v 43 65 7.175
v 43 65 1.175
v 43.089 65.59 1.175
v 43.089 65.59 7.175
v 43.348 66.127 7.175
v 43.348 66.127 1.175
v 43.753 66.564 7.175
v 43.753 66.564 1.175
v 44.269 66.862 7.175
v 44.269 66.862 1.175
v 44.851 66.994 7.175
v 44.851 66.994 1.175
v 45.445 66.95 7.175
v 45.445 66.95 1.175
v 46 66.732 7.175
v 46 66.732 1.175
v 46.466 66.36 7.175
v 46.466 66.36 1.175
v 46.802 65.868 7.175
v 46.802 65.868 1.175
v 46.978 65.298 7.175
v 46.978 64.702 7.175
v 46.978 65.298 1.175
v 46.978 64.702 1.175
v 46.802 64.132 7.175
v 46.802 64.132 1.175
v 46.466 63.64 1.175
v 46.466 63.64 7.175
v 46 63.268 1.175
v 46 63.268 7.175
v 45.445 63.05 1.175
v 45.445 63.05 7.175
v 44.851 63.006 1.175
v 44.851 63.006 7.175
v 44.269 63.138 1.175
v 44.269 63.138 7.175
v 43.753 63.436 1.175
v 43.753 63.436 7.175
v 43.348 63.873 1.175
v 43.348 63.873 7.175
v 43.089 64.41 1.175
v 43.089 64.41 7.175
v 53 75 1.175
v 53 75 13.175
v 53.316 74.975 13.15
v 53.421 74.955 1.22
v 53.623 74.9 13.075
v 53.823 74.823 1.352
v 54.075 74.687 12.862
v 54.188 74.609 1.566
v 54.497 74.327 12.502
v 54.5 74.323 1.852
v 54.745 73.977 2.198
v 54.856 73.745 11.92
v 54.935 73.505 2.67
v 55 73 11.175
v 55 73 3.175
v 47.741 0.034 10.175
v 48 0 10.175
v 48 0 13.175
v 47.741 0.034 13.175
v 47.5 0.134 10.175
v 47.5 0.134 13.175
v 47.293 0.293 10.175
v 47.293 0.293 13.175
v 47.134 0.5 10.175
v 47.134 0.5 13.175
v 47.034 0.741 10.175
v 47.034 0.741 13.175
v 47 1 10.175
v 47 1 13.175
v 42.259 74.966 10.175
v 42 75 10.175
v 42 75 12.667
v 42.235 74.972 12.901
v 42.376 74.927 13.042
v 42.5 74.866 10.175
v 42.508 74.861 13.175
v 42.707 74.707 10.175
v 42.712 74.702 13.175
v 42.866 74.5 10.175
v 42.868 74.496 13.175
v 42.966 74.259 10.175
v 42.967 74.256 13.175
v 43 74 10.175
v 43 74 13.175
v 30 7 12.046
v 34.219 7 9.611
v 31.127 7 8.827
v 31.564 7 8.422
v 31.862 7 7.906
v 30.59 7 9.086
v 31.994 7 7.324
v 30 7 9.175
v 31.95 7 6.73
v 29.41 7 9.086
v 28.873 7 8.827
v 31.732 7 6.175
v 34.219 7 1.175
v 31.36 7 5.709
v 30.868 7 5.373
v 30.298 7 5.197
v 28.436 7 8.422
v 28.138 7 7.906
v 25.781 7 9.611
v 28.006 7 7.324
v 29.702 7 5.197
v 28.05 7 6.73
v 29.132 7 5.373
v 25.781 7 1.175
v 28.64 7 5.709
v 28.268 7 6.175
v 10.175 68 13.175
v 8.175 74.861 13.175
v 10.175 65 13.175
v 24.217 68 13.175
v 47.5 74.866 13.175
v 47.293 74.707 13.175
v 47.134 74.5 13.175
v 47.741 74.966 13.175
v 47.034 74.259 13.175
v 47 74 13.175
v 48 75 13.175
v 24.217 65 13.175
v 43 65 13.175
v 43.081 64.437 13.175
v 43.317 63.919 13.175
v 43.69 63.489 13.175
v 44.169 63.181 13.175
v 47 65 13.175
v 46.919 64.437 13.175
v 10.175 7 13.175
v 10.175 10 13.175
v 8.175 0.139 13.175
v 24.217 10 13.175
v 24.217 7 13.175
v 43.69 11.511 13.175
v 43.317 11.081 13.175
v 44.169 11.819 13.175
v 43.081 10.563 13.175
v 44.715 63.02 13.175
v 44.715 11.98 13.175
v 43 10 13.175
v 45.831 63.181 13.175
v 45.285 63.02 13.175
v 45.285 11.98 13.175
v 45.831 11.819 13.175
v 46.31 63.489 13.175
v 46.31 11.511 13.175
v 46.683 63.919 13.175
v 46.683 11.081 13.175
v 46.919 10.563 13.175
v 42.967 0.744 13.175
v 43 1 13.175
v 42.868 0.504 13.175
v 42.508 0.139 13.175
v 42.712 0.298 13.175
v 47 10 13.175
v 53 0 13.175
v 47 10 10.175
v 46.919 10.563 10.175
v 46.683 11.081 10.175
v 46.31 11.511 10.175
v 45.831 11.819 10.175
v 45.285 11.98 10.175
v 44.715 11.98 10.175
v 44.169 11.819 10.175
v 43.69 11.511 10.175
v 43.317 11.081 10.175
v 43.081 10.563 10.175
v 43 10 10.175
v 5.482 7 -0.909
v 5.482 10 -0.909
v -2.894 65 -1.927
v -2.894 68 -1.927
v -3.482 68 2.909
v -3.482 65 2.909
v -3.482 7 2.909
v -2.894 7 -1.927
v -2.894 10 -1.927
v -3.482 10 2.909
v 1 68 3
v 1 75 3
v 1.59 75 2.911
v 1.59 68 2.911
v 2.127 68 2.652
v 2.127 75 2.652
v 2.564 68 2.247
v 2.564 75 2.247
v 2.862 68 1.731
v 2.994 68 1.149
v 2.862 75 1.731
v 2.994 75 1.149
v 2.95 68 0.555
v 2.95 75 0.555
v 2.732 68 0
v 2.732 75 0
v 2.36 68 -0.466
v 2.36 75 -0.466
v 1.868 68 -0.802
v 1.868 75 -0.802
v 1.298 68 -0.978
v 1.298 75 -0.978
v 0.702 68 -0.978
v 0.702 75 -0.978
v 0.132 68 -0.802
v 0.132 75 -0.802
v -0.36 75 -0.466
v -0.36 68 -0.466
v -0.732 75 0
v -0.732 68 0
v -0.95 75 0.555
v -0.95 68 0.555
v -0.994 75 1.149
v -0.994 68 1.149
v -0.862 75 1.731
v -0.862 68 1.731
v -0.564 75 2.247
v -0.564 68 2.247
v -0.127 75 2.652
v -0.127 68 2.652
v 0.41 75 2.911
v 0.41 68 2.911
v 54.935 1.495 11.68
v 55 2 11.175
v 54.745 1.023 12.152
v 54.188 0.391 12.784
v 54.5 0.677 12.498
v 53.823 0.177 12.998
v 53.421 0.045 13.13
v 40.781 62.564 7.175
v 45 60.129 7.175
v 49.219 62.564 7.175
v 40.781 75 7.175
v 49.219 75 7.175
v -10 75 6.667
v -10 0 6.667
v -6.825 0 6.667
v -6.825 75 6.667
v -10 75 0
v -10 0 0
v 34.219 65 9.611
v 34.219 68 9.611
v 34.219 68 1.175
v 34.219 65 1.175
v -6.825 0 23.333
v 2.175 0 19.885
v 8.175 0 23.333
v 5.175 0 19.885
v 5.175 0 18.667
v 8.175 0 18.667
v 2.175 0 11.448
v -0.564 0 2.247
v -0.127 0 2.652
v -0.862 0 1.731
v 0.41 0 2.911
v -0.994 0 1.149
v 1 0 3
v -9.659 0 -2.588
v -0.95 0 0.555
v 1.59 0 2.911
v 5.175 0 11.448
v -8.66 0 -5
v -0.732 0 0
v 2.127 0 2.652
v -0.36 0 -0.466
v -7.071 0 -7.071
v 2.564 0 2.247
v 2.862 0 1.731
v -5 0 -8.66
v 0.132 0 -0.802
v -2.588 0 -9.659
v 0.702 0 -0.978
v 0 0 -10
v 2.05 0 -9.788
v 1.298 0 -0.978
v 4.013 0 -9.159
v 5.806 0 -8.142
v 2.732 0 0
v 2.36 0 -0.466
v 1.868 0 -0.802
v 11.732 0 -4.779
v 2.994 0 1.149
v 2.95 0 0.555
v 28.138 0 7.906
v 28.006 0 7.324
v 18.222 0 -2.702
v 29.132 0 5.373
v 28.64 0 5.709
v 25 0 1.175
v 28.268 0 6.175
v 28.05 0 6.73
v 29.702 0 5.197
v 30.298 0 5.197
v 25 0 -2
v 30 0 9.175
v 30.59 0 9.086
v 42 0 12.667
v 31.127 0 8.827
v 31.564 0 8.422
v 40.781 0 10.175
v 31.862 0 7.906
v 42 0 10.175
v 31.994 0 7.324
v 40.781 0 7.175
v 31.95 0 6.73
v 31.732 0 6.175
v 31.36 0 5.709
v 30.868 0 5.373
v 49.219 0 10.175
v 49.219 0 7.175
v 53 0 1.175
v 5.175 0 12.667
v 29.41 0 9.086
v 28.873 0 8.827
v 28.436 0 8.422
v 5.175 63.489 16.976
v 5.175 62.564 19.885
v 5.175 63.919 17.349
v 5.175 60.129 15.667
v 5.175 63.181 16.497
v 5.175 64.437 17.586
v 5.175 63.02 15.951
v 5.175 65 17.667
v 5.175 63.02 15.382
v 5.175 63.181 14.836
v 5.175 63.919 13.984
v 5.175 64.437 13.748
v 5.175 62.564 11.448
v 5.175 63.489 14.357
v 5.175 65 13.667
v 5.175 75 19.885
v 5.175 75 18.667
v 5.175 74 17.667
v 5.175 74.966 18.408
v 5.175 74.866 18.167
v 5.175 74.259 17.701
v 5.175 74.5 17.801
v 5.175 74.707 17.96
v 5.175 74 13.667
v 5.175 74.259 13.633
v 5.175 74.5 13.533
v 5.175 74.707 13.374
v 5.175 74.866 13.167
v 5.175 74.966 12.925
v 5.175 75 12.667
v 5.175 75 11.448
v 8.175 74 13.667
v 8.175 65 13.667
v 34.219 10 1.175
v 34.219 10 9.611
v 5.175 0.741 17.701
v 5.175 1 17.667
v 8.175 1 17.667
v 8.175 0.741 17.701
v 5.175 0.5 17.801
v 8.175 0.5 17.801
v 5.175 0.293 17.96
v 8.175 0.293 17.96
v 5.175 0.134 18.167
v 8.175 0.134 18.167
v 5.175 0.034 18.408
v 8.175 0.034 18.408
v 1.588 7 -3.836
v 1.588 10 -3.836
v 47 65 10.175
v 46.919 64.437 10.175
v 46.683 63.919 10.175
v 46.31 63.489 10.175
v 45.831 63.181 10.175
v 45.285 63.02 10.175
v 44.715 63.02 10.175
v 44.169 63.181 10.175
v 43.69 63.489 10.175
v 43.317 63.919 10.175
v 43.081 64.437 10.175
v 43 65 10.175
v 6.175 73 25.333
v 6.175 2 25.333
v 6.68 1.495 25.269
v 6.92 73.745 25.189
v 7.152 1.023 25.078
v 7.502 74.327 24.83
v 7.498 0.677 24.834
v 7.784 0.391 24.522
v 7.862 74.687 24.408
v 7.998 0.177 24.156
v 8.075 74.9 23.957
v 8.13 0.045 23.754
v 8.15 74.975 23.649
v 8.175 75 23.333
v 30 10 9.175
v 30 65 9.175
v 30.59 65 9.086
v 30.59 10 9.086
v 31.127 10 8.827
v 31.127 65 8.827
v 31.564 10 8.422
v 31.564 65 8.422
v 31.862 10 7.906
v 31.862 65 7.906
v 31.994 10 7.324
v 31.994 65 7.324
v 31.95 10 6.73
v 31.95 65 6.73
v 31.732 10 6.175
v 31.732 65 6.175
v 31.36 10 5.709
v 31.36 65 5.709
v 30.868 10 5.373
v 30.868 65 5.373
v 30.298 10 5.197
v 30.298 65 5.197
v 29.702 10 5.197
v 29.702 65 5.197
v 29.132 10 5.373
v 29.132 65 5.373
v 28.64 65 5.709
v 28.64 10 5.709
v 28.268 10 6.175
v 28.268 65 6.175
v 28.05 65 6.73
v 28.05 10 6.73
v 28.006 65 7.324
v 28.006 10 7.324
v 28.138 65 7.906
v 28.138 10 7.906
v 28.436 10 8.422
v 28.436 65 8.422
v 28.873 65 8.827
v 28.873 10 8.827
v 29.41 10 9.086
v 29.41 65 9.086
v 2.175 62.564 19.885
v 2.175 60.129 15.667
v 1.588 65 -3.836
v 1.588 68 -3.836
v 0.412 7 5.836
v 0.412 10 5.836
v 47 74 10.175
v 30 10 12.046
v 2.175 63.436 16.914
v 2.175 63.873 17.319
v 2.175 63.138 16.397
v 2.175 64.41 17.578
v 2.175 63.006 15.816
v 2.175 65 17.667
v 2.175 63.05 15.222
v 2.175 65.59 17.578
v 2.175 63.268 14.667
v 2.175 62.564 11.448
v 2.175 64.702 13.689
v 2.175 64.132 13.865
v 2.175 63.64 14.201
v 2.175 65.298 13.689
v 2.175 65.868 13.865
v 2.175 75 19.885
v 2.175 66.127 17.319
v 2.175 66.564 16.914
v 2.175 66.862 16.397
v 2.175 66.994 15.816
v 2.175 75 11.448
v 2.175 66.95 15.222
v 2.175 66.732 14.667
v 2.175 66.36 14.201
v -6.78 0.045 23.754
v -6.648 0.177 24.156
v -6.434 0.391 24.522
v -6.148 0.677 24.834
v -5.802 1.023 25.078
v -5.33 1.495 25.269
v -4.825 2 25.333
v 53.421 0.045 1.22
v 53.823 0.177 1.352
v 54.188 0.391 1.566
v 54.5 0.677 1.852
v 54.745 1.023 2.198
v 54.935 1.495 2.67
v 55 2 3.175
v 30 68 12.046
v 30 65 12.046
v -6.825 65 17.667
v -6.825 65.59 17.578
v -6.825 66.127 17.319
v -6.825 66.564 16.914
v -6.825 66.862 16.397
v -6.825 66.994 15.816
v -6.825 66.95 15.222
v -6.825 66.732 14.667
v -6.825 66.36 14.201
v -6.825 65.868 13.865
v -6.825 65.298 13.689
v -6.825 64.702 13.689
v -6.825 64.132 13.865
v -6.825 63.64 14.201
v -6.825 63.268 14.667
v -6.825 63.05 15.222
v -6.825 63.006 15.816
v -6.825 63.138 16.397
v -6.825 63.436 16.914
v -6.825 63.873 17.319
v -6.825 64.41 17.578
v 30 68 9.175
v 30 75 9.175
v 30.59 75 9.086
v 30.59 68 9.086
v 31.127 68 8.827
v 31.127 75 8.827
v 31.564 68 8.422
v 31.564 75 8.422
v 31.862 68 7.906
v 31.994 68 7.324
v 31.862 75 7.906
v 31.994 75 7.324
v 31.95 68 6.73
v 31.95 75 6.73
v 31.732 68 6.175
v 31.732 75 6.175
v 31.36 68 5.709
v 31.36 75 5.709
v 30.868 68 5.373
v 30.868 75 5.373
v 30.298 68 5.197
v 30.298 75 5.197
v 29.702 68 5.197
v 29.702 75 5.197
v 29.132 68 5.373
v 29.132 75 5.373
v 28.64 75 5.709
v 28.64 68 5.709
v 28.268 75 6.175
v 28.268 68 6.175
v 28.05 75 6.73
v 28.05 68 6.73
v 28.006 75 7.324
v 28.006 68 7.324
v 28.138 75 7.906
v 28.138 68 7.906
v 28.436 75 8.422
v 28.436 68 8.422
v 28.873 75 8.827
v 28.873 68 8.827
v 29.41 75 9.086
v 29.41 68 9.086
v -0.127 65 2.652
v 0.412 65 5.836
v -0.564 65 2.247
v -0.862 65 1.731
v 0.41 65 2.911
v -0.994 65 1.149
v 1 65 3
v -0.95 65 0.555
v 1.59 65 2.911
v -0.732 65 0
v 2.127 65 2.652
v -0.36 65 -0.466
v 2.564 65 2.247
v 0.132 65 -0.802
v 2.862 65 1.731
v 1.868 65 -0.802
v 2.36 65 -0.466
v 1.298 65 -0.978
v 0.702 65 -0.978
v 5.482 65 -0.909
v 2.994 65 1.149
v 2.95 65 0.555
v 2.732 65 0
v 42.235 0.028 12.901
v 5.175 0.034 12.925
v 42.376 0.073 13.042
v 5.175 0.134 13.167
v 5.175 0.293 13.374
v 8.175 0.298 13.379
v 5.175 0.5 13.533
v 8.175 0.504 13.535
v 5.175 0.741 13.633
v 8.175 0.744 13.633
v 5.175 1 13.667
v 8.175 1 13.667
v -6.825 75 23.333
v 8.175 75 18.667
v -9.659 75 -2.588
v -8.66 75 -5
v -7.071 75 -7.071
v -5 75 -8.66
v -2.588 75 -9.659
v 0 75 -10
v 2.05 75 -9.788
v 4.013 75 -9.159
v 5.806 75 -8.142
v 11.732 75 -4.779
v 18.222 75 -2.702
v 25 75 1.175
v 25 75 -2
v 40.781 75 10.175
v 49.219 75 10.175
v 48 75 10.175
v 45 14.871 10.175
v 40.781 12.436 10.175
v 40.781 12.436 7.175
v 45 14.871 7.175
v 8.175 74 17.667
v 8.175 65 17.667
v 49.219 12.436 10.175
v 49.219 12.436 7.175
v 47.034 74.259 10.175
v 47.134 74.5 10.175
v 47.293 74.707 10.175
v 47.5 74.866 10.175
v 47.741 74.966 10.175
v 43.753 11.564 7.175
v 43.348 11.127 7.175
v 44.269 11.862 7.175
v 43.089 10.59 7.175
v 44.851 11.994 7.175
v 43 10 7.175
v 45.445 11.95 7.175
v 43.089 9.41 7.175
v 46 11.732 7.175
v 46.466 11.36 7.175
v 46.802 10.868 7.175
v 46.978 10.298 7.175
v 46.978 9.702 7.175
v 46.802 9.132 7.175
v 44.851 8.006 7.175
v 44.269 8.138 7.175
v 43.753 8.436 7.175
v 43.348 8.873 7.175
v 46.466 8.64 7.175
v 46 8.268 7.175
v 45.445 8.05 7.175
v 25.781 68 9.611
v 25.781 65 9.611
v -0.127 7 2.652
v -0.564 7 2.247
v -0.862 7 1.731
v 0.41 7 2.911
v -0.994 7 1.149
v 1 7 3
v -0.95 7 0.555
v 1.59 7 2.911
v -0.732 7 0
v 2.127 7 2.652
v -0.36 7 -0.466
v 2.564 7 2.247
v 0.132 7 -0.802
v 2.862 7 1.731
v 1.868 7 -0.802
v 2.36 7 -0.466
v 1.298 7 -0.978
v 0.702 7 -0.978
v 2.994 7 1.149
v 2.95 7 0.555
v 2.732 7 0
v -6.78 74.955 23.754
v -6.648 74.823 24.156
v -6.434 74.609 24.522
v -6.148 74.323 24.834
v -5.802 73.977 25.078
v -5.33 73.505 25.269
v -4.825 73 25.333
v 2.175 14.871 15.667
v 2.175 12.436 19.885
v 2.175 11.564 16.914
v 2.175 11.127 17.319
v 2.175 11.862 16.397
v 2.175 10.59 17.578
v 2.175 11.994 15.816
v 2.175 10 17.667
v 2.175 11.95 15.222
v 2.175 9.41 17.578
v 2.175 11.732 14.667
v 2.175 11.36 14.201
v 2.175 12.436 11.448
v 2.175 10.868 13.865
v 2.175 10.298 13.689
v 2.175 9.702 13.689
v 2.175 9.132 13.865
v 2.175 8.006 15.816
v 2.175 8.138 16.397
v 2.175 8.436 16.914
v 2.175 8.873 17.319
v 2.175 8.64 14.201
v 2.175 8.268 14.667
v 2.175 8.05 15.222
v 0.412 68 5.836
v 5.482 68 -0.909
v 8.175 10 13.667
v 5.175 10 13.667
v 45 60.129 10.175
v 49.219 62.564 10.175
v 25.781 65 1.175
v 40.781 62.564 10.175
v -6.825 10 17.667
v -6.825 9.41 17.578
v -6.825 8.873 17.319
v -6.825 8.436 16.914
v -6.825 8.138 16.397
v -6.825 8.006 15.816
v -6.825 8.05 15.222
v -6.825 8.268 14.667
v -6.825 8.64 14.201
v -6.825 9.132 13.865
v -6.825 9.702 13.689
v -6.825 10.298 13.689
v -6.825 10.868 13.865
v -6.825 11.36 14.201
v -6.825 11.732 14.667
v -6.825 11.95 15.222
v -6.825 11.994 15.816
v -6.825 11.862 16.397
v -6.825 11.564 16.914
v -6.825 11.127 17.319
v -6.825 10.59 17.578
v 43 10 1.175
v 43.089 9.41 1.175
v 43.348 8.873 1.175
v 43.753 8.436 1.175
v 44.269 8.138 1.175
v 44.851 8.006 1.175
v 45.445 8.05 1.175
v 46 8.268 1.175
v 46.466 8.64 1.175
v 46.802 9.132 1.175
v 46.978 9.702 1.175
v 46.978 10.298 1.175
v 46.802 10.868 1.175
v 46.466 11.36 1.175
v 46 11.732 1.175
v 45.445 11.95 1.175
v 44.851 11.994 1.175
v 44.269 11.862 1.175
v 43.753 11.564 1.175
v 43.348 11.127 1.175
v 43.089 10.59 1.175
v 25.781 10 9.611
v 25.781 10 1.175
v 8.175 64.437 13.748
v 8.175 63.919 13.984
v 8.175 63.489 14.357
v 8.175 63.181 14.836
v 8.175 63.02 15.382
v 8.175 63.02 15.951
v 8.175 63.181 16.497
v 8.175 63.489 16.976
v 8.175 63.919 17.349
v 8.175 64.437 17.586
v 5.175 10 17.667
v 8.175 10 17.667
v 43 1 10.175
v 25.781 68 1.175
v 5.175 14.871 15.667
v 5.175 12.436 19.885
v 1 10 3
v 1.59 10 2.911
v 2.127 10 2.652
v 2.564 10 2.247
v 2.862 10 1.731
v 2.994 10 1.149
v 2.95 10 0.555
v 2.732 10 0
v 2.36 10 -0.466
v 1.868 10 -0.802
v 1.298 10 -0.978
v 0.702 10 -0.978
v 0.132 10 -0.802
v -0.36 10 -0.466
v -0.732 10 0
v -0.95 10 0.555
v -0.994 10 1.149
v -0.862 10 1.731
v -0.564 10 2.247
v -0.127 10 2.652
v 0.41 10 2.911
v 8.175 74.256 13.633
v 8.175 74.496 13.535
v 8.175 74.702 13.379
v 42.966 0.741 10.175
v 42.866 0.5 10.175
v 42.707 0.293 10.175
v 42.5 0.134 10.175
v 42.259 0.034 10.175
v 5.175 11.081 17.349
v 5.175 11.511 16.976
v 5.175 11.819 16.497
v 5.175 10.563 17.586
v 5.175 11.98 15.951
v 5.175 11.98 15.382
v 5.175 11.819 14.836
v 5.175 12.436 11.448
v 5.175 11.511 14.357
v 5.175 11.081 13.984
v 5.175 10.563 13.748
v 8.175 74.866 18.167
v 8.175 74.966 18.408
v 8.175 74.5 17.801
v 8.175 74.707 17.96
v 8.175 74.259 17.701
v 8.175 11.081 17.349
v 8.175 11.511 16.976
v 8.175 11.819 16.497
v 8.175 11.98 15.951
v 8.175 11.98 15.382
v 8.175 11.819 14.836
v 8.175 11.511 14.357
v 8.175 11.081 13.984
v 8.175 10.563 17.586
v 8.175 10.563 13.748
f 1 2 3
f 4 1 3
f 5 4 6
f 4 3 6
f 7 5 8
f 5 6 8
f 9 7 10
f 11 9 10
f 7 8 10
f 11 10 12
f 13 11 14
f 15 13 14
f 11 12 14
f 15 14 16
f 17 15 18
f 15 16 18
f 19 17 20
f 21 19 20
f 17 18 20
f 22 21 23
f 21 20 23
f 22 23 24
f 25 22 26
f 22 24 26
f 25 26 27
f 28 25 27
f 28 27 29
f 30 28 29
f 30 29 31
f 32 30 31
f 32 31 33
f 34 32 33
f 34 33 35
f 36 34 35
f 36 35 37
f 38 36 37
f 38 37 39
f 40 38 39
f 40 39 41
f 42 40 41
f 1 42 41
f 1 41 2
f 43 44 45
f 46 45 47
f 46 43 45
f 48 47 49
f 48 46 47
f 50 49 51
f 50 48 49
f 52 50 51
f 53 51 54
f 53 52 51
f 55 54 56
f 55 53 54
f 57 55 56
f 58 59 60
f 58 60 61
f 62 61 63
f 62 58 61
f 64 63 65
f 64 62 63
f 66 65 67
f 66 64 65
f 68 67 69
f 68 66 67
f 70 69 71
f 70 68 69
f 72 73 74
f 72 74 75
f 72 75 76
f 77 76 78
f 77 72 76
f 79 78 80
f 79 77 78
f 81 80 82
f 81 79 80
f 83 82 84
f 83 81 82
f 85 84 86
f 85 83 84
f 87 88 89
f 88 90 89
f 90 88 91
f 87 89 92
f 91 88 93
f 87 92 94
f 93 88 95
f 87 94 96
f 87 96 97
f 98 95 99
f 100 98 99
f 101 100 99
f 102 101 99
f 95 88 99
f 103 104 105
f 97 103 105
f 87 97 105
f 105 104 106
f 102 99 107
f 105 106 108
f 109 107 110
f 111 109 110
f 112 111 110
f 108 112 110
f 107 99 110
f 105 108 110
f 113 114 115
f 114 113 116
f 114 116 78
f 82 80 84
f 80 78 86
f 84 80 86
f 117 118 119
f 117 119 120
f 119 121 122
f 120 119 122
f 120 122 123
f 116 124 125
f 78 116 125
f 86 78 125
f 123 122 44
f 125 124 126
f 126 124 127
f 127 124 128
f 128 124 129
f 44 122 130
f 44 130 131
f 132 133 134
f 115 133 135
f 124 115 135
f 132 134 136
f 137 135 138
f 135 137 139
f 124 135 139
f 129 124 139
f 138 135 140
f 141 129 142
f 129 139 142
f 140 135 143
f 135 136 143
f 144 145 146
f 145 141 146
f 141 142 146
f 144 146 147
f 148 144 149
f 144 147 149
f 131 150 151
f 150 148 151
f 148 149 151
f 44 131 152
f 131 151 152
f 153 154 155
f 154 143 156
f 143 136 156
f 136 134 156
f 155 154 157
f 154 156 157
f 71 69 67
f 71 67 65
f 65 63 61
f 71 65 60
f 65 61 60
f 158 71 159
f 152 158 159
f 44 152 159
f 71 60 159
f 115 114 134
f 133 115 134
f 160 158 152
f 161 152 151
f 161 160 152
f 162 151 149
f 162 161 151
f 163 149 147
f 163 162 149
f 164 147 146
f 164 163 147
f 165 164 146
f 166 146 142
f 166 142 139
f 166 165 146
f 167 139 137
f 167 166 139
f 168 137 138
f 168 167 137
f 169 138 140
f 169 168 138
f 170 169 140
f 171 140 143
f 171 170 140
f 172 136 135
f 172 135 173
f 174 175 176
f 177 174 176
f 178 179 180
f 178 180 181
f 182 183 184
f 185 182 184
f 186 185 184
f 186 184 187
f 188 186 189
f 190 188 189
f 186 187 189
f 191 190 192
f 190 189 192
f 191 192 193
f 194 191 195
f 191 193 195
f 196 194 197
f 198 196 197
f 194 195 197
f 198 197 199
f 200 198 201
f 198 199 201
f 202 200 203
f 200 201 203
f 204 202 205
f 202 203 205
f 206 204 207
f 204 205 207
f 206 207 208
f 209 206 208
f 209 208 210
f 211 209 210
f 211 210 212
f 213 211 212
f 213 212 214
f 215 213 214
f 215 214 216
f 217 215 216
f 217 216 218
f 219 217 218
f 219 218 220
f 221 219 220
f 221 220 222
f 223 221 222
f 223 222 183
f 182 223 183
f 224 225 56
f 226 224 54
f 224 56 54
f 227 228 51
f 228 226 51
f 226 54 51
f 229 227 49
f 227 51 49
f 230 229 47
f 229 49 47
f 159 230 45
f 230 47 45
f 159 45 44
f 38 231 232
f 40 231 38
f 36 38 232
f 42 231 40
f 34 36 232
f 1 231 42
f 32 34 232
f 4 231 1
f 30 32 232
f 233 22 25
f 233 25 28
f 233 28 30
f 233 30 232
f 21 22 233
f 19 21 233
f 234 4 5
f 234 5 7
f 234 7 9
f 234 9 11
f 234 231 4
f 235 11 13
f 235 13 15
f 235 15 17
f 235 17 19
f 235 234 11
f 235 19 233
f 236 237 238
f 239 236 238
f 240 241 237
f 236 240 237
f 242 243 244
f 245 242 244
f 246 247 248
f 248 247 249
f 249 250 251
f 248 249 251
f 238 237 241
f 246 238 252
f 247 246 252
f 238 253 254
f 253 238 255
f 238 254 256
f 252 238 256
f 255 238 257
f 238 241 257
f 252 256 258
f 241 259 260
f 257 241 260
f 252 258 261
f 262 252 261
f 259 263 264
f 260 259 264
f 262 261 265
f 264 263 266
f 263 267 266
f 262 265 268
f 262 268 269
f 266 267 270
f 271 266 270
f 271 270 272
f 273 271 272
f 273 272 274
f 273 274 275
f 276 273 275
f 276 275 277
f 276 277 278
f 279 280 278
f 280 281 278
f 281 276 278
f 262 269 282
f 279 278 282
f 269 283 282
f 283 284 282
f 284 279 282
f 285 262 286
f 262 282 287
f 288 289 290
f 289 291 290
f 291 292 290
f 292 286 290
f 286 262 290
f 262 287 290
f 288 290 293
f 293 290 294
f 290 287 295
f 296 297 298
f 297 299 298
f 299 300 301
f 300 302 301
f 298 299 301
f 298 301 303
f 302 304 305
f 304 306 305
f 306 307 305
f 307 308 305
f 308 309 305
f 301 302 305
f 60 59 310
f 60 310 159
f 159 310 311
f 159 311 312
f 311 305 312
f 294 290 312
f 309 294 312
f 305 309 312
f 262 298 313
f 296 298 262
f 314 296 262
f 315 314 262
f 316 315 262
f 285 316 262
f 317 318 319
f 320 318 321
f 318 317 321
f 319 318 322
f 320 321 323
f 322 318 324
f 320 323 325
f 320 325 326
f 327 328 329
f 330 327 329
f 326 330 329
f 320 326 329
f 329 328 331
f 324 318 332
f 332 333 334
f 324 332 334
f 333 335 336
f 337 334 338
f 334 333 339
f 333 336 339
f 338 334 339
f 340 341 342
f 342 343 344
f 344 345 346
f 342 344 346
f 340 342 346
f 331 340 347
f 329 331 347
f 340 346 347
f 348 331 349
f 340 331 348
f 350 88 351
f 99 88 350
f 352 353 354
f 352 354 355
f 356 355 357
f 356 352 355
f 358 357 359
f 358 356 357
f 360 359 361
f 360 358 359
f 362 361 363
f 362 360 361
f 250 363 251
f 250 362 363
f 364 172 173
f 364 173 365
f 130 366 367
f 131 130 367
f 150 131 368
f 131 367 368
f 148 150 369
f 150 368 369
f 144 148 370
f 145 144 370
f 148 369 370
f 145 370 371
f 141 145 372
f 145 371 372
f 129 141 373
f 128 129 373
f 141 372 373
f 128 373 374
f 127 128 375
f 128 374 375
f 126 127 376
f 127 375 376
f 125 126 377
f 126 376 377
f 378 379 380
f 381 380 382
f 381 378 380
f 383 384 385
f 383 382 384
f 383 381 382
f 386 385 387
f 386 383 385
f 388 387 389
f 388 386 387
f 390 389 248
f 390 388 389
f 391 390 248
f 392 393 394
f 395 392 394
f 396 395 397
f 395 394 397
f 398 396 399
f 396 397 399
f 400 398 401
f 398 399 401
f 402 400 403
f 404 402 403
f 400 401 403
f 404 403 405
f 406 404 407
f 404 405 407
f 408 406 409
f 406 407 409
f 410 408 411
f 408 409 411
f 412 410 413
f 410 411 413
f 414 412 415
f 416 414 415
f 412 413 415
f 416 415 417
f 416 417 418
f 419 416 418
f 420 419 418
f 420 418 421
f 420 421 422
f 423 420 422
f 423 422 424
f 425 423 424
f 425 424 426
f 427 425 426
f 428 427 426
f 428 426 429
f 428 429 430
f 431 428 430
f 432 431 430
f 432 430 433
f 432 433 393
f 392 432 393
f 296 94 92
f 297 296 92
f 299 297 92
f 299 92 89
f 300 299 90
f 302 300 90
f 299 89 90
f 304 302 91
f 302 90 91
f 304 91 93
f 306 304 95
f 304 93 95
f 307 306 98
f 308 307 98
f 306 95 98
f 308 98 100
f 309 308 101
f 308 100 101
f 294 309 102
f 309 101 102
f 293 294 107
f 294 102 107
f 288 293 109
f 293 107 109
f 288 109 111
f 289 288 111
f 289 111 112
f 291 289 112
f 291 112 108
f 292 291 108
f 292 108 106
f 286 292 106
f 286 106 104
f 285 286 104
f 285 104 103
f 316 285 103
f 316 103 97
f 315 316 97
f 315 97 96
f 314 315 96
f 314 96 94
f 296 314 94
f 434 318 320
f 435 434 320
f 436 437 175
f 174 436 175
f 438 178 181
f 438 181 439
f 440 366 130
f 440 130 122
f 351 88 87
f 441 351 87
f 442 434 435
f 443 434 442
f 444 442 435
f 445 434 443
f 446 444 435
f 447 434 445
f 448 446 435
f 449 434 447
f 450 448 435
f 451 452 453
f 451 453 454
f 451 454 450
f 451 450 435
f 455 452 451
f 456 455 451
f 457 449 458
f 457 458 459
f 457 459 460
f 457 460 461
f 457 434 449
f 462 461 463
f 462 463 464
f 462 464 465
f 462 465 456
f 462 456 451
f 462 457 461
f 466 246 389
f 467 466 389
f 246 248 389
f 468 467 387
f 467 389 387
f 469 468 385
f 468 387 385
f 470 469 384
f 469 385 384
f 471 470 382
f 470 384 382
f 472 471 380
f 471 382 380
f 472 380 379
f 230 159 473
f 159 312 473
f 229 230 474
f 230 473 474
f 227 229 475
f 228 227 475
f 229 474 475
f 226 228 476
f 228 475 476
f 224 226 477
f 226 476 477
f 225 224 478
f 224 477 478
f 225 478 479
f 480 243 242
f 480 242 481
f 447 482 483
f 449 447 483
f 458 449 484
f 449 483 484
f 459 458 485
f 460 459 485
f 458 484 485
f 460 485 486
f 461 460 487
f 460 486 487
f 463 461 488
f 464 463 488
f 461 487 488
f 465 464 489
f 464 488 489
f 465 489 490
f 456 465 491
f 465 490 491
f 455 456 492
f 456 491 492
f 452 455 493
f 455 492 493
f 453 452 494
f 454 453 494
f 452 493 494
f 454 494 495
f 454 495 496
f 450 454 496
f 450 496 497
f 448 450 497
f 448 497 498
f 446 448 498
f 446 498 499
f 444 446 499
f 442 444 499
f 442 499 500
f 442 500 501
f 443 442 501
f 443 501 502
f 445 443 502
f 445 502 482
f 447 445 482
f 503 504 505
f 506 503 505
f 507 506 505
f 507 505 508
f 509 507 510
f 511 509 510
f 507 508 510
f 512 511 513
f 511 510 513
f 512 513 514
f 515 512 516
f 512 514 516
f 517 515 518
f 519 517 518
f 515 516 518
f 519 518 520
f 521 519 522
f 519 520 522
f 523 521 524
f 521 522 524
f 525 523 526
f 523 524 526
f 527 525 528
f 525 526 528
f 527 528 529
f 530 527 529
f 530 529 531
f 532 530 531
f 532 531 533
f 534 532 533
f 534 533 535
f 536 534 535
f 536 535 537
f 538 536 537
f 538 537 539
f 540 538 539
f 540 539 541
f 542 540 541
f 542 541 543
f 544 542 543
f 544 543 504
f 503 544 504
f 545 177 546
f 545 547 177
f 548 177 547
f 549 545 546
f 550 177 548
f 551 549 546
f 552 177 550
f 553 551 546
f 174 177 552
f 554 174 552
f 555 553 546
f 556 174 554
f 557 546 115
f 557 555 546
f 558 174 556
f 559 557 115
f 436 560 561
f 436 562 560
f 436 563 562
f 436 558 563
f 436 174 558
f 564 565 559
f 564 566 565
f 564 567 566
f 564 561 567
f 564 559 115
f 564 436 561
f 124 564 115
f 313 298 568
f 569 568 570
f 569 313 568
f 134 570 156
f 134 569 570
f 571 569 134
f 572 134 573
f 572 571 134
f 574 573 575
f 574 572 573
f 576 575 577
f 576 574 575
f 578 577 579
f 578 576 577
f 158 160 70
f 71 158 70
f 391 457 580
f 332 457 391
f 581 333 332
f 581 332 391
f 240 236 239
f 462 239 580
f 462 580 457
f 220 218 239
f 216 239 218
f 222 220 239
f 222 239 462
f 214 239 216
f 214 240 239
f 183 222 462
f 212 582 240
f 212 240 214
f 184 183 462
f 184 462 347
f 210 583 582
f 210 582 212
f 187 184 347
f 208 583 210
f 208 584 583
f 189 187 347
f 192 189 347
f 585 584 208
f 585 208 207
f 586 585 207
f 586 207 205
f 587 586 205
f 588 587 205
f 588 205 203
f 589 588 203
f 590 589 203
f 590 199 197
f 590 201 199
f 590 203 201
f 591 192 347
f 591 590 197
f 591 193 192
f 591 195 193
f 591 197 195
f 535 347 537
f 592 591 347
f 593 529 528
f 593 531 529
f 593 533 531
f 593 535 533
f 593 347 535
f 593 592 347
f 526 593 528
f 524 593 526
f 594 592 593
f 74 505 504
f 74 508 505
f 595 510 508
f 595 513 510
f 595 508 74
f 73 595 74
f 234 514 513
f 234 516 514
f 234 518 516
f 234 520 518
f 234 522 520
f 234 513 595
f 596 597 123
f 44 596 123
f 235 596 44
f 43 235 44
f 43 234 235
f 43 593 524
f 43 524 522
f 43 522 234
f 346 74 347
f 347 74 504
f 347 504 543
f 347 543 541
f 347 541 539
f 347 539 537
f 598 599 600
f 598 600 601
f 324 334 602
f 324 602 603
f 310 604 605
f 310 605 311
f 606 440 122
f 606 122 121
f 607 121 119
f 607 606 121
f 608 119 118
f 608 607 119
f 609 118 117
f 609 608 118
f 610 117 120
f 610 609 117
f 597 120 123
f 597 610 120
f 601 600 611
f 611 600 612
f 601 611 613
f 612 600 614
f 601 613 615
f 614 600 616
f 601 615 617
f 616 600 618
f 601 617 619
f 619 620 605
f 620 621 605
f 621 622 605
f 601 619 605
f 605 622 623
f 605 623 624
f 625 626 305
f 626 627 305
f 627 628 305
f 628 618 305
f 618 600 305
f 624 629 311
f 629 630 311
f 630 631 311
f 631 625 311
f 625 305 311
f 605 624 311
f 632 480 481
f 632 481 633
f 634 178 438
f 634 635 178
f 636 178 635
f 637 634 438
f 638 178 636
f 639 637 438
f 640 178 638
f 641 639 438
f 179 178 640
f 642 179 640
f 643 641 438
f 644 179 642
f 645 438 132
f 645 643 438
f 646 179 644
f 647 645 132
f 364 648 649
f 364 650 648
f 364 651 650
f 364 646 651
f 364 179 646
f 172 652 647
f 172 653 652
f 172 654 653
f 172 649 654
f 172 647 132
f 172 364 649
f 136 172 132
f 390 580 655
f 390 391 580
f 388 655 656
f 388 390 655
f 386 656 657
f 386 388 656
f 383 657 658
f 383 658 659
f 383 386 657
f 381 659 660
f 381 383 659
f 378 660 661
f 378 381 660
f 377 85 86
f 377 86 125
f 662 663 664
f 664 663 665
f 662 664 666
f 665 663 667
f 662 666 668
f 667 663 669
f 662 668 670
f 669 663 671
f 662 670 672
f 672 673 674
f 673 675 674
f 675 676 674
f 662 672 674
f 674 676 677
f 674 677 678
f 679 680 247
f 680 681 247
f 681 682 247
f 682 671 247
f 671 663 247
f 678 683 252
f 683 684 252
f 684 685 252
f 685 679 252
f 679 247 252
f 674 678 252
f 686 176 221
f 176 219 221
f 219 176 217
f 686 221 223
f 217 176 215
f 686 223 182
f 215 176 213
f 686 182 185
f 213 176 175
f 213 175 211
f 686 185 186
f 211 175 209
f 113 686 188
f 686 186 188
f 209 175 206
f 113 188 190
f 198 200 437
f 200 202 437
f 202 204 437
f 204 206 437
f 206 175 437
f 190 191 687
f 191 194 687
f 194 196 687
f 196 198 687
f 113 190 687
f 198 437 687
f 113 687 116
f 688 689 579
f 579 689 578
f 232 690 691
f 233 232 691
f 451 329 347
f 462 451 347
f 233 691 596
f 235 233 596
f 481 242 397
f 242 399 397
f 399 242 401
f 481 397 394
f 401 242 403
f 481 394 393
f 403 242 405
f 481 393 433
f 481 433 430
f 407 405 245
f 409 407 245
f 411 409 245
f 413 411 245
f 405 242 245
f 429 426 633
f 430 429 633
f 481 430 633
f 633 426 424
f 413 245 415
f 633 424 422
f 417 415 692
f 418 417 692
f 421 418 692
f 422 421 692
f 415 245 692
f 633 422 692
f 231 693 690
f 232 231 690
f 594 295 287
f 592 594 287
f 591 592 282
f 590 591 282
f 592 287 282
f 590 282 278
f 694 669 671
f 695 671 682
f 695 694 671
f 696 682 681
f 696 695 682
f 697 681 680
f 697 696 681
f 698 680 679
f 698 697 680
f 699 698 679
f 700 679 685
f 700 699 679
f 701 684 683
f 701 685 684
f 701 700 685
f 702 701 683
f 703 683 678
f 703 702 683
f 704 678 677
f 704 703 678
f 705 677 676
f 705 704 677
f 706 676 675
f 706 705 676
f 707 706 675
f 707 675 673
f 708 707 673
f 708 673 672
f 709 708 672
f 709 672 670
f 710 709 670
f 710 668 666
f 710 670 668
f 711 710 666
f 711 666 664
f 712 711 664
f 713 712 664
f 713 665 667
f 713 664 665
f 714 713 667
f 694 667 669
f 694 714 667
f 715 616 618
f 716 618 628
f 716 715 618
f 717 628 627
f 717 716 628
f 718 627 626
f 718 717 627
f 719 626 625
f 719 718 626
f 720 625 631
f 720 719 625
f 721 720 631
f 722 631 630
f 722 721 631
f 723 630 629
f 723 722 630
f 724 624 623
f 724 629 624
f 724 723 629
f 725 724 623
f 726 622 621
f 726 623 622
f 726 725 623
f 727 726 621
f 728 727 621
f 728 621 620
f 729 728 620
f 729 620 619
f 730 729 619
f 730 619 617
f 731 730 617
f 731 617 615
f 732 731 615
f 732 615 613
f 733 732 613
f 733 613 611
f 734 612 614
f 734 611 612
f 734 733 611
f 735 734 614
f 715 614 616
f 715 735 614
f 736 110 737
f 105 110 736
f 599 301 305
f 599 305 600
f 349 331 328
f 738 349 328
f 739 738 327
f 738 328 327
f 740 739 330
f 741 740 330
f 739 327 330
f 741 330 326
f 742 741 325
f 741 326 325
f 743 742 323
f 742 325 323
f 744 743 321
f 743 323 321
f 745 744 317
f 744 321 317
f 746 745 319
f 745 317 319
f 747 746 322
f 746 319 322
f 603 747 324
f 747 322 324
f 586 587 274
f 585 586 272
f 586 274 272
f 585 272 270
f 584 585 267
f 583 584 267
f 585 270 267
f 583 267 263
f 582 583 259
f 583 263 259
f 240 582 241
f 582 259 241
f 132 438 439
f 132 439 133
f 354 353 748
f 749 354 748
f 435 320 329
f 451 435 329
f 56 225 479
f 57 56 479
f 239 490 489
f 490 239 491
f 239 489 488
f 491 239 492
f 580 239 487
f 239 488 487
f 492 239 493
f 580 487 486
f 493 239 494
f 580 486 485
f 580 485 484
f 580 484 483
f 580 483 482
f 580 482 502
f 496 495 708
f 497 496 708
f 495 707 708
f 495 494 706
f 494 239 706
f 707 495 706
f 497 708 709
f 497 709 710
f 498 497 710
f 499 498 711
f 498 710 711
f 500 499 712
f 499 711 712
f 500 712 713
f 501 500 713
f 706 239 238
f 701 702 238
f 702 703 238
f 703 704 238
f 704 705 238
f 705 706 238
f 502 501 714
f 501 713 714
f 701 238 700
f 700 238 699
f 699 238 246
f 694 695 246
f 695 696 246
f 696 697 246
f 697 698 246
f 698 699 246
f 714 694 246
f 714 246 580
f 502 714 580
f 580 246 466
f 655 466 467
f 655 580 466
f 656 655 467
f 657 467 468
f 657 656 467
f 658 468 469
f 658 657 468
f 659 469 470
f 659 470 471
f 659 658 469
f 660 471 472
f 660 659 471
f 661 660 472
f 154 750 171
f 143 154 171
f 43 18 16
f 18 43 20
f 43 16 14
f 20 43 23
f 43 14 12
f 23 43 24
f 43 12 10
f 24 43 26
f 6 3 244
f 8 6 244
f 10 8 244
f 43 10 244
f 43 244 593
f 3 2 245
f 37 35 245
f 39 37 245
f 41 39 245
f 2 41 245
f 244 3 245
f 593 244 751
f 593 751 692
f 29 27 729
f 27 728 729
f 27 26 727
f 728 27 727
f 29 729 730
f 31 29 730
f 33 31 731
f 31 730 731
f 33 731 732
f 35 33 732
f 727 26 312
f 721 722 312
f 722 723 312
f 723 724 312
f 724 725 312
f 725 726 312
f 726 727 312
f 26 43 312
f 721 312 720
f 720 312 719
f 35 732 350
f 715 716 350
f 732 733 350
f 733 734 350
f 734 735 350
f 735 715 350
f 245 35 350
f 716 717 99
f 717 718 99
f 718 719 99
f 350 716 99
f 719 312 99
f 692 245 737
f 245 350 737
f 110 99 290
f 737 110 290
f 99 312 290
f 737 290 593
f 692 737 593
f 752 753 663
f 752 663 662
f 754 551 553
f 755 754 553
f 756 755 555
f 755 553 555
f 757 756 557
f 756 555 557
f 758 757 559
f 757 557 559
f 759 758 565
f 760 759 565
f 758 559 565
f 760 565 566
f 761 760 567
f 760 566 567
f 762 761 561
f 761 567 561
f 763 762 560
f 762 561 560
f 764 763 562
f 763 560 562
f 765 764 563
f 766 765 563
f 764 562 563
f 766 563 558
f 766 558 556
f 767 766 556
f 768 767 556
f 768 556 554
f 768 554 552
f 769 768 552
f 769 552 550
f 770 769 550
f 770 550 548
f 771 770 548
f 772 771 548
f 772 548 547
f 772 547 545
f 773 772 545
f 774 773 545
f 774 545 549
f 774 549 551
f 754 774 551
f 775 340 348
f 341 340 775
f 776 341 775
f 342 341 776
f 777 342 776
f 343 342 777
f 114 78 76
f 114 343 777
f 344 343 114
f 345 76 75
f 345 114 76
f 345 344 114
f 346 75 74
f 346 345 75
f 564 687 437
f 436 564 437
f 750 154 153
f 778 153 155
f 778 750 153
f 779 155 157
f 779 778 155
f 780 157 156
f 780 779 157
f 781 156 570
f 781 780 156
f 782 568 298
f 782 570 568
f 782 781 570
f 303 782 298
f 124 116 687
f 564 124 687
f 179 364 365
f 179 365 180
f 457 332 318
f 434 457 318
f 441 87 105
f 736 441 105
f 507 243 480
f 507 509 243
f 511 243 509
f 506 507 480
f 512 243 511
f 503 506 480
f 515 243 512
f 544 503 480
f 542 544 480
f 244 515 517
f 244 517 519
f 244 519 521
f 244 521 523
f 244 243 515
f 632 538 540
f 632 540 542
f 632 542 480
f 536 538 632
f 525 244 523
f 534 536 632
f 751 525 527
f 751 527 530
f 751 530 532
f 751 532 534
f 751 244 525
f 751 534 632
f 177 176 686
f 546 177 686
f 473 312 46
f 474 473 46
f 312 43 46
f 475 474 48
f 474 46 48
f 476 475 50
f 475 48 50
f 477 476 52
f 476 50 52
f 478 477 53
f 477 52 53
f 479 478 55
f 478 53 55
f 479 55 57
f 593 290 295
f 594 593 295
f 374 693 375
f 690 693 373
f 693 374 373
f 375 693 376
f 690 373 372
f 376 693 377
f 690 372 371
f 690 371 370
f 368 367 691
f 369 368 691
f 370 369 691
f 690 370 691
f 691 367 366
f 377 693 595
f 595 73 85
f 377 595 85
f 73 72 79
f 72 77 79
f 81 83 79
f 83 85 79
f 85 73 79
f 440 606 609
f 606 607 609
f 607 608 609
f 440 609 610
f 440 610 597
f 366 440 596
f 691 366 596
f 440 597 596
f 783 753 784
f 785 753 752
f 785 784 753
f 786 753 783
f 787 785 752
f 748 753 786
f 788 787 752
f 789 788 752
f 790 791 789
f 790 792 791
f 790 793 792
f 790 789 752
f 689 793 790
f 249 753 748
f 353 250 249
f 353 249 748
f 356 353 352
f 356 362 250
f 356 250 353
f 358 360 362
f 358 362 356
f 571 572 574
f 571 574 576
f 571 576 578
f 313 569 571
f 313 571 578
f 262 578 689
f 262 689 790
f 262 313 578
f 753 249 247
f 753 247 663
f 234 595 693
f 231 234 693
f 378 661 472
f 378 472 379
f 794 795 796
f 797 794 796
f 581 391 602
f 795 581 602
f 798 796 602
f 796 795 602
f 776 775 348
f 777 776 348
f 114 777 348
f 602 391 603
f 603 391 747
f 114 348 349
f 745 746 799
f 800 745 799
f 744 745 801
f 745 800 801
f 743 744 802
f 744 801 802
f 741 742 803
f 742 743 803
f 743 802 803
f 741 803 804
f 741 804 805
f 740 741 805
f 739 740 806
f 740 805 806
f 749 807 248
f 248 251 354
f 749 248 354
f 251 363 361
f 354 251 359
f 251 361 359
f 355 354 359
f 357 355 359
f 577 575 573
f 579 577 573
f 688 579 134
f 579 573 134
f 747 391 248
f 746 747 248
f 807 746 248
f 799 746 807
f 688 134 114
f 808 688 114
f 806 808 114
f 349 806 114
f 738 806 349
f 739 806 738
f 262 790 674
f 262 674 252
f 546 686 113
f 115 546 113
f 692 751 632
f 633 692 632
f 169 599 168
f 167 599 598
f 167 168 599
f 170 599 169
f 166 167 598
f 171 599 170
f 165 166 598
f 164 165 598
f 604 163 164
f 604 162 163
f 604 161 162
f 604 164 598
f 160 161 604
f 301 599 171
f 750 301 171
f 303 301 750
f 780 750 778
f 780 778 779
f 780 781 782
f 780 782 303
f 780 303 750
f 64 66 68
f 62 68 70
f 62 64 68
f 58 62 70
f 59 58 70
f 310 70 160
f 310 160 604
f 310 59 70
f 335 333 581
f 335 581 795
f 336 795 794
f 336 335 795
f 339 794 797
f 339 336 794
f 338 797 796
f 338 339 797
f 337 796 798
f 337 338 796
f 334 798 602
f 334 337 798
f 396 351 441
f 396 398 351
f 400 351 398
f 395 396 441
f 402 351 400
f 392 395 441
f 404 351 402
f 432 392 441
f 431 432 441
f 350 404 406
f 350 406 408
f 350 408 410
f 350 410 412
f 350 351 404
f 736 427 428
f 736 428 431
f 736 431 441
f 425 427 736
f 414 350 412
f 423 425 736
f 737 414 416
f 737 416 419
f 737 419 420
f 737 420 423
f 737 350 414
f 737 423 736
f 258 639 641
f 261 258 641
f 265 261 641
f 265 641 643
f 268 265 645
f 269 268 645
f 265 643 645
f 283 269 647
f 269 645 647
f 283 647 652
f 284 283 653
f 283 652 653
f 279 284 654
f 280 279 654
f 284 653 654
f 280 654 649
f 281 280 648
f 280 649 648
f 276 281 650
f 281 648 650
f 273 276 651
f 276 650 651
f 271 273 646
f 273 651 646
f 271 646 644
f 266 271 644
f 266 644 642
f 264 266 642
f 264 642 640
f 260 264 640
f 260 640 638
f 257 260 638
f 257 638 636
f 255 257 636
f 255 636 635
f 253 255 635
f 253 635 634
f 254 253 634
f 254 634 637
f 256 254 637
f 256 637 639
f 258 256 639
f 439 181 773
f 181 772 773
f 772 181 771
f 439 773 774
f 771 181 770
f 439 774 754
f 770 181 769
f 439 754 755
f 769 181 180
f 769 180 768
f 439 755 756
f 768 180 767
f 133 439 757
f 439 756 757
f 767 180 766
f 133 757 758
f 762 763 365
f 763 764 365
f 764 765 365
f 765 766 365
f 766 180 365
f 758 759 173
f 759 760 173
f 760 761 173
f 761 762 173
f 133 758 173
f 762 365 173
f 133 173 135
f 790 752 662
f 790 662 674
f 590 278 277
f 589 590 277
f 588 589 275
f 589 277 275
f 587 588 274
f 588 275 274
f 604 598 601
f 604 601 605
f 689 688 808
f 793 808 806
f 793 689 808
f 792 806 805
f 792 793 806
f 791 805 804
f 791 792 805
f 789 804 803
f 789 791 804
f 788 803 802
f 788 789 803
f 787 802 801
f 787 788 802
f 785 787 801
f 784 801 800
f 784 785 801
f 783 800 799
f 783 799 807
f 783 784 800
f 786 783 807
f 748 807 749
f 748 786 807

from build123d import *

# Parameters (mm, degrees)
BOSS_EXTRUDE1_DEPTH = 75
SKETCH2_R           = 2
CUT_EXTRUDE1_DEPTH  = 15
SKETCH4_R           = 2
CUT_EXTRUDE2_DEPTH  = 12
SKETCH3_R           = 2
CUT_EXTRUDE3_DEPTH  = 75
CUT_EXTRUDE4_START  = -3
CUT_EXTRUDE4_DEPTH  = 3
CUT_EXTRUDE5_START  = -3
CUT_EXTRUDE5_DEPTH  = 3
CUT_EXTRUDE6_START  = -3
CUT_EXTRUDE6_DEPTH  = 3
CUT_EXTRUDE7_START  = -3
CUT_EXTRUDE7_DEPTH  = 3
CUT_EXTRUDE8_START  = -7
CUT_EXTRUDE8_DEPTH  = 3
FILLET2_START       = 5.175
FILLET2_DEPTH       = 42.1845
FILLET2_START_2     = 10.175
FILLET2_2_DEPTH     = 3.491666667
FILLET2_3_DEPTH     = 37.825
FILLET3_R           = 2


with BuildPart() as part:
    # Sketch1 → Boss-Extrude1 (new body)
    with BuildSketch(Plane(origin=(0, 0, 0), x_dir=(1, 0, 0), z_dir=(0, 1, 0))):
        with BuildLine():
            Line((-6.825, -6.666666667), (-6.825, -25.333333333))
            Line((-6.825, -25.333333333), (8.175, -25.333333333))
            Line((8.175, -25.333333333), (8.175, -13.175))
            Line((8.175, -13.175), (55, -13.175))
            Line((55, -13.175), (55, -1.175))
            Line((55, -1.175), (25, -1.175))
            Line((25, -1.175), (25, 2))
            ThreePointArc((25, 2), (14.923352523, 3.572976633), (5.805515239, 8.142235123))
            ThreePointArc((5.805515239, 8.142235123), (3.047757271, 9.524241472), (0, 10))
            ThreePointArc((0, 10), (-7.071067812, 7.071067812), (-10, 0))
            Line((-10, 0), (-10, -6.666666667))
            Line((-10, -6.666666667), (-6.825, -6.666666667))
        make_face()
    extrude(amount=BOSS_EXTRUDE1_DEPTH)

    # Sketch2 → Cut-Extrude1 (cut)
    with BuildSketch(Plane.ZY.offset(6.825)):
        with Locations((15.666666667, 65)):
            Circle(SKETCH2_R)
    cut_extrude1 = extrude(amount=-CUT_EXTRUDE1_DEPTH, mode=Mode.SUBTRACT)

    # Sketch4 → Cut-Extrude2 (cut)
    with BuildSketch(Plane(origin=(0, 0, 1.175), x_dir=(-1, 0, 0), z_dir=(0, 0, -1))):
        with Locations((-45, 65)):
            Circle(SKETCH4_R)
    cut_extrude2 = extrude(amount=-CUT_EXTRUDE2_DEPTH, mode=Mode.SUBTRACT)

    # Sketch3 → Cut-Extrude3 (cut)
    with BuildSketch(Plane(origin=(0, 75, 0), x_dir=(1, 0, 0), z_dir=(0, 1, 0))):
        with Locations(Location((1, -1, 0), (0, 0, 270))):
            Circle(SKETCH3_R)
        with Locations(Location((30, -7.175, 0), (0, 0, 270))):
            Circle(SKETCH3_R)
    extrude(amount=-CUT_EXTRUDE3_DEPTH, mode=Mode.SUBTRACT)

    # Sketch5 → Cut-Extrude4 (cut)
    with BuildSketch(Plane(origin=(8.175, 0, 0), x_dir=(0, 0, -1), z_dir=(1, 0, 0)).offset(CUT_EXTRUDE4_START)):
        Polygon((-19.885416667, 62.564303552), (-15.666666667, 60.128607104), (-11.447916667, 62.564303552), (-11.447916667, 75), (-19.885416667, 75), align=None)
    cut_extrude4 = extrude(amount=-CUT_EXTRUDE4_DEPTH, mode=Mode.SUBTRACT)

    # Sketch6 → Cut-Extrude5 (cut)
    with BuildSketch(Plane(origin=(8.175, 0, 0), x_dir=(0, 0, -1), z_dir=(1, 0, 0)).offset(CUT_EXTRUDE5_START)):
        with BuildLine():
            Line((-13.666666667, 65), (-13.666666667, 75))
            Line((-13.666666667, 75), (-17.666666667, 75))
            Line((-17.666666667, 75), (-17.666666667, 65))
            ThreePointArc((-17.666666667, 65), (-15.666666667, 67), (-13.666666667, 65))
        make_face()
    cut_extrude5 = extrude(amount=CUT_EXTRUDE5_DEPTH, mode=Mode.SUBTRACT)

    # Sketch7 → Cut-Extrude6 (cut)
    with BuildSketch(Plane.XY.offset(13.175).offset(CUT_EXTRUDE6_START)):
        Polygon((40.78125, 62.564303552), (45, 60.128607104), (49.21875, 62.564303552), (49.21875, 75), (40.78125, 75), align=None)
    cut_extrude6 = extrude(amount=-CUT_EXTRUDE6_DEPTH, mode=Mode.SUBTRACT)

    # Sketch8 → Cut-Extrude7 (cut)
    with BuildSketch(Plane.XY.offset(13.175).offset(CUT_EXTRUDE7_START)):
        with BuildLine():
            Line((47, 65), (47, 75))
            Line((47, 75), (43, 75))
            Line((43, 75), (43, 65))
            ThreePointArc((43, 65), (45, 67), (47, 65))
        make_face()
    cut_extrude7 = extrude(amount=CUT_EXTRUDE7_DEPTH, mode=Mode.SUBTRACT)

    # Sketch10 → Cut-Extrude8 (cut)
    with BuildSketch(Plane(origin=(0, 75, 0), x_dir=(1, 0, 0), z_dir=(0, 1, 0)).offset(CUT_EXTRUDE8_START)):
        Polygon((0.411941919, -5.835768444), (10.175, -13.175), (24.216737808, -13.175), (5.48192736, 0.908610985), (1.588058081, 3.835768444), (-2.893869279, 1.927157459), (-3.48192736, -2.908610985), align=None)
        Polygon((25.78125, -4.739303552), (25.78125, -1.175), (34.21875, -1.175), (34.21875, -4.739303552), (34.21875, -9.610696448), (30, -12.046392896), (25.78125, -9.610696448), align=None)
    cut_extrude8 = extrude(amount=-CUT_EXTRUDE8_DEPTH, mode=Mode.SUBTRACT)

    # Mirror2: Cut-Extrude1, Cut-Extrude2, Cut-Extrude4, Cut-Extrude5, Cut-Extrude6, Cut-Extrude7, Cut-Extrude8 across plane
    add(cut_extrude1.mirror(Plane.ZX.offset(37.5)), mode=Mode.SUBTRACT)
    add(cut_extrude2.mirror(Plane.ZX.offset(37.5)), mode=Mode.SUBTRACT)
    add(cut_extrude4.mirror(Plane.ZX.offset(37.5)), mode=Mode.SUBTRACT)
    add(cut_extrude5.mirror(Plane.ZX.offset(37.5)), mode=Mode.SUBTRACT)
    add(cut_extrude6.mirror(Plane.ZX.offset(37.5)), mode=Mode.SUBTRACT)
    add(cut_extrude7.mirror(Plane.ZX.offset(37.5)), mode=Mode.SUBTRACT)
    add(cut_extrude8.mirror(Plane.ZX.offset(37.5)), mode=Mode.SUBTRACT)

    # Fillet2: read off the stored shape, not the designer's step
    # Fillet2 outline → Fillet2 (cut)
    with BuildSketch(Plane.YZ.offset(FILLET2_START)):
        with BuildLine():
            Line((1, 13.666666667), (0, 13.666666667))
            Line((0, 13.666666667), (0, 12.666666667))
            ThreePointArc((0, 12.666666667), (0.292893219, 13.373773448), (1, 13.666666667))
        make_face()
        with BuildLine():
            ThreePointArc((1, 17.666666667), (0.292893218, 17.959559886), (0, 18.666666667))
            Line((0, 18.666666667), (0, 17.666666667))
            Line((0, 17.666666667), (1, 17.666666667))
        make_face()
    extrude(amount=FILLET2_DEPTH, mode=Mode.SUBTRACT)

    # Fillet2 2 outline → Fillet2 2 (cut)
    with BuildSketch(Plane.XY.offset(FILLET2_START_2)):
        with BuildLine():
            Line((47, 1), (47, 0))
            Line((47, 0), (47.3595, 0))
            Line((47.3595, 0), (48, 0))
            ThreePointArc((48, 0), (47.292893219, 0.292893219), (47, 1))
        make_face()
        with BuildLine():
            Line((48, 75), (47, 75))
            Line((47, 75), (47, 74))
            ThreePointArc((47, 74), (47.292893219, 74.707106781), (48, 75))
        make_face()
        with BuildLine():
            Line((43, 75), (42, 75))
            ThreePointArc((42, 75), (42.707106781, 74.707106781), (43, 74))
            Line((43, 74), (43, 75))
        make_face()
        with BuildLine():
            ThreePointArc((43, 1), (42.707106781, 0.292893219), (42, 0))
            Line((42, 0), (43, 0))
            Line((43, 0), (43, 1))
        make_face()
    extrude(amount=FILLET2_2_DEPTH, mode=Mode.SUBTRACT)

    # Fillet2 3 outline → Fillet2 3 (cut)
    with BuildSketch(Plane.YZ.offset(FILLET2_START)):
        with BuildLine():
            Line((74, 17.666666667), (75, 17.666666667))
            Line((75, 17.666666667), (75, 18.666666667))
            ThreePointArc((75, 18.666666667), (74.707106782, 17.959559886), (74, 17.666666667))
        make_face()
        with BuildLine():
            Line((75, 12.666666667), (75, 13.666666667))
            Line((75, 13.666666667), (74, 13.666666667))
            ThreePointArc((74, 13.666666667), (74.707106781, 13.373773448), (75, 12.666666667))
        make_face()
    extrude(amount=FILLET2_3_DEPTH, mode=Mode.SUBTRACT)

    # Fillet3
    fillet3_edges = [part.edges().sort_by_distance(p)[0] for p in [
        (55, 0, 7.175),
        (0.675, 0, 25.333333333),
        (55, 37.5, 1.175),
        (55, 37.5, 13.175),
        (8.175, 37.5, 25.333333333),
        (-6.825, 37.5, 25.333333333),
        (0.675, 75, 25.333333333),
        (55, 75, 7.175),
    ]]
    fillet(fillet3_edges, radius=FILLET3_R)


solid = part.part
